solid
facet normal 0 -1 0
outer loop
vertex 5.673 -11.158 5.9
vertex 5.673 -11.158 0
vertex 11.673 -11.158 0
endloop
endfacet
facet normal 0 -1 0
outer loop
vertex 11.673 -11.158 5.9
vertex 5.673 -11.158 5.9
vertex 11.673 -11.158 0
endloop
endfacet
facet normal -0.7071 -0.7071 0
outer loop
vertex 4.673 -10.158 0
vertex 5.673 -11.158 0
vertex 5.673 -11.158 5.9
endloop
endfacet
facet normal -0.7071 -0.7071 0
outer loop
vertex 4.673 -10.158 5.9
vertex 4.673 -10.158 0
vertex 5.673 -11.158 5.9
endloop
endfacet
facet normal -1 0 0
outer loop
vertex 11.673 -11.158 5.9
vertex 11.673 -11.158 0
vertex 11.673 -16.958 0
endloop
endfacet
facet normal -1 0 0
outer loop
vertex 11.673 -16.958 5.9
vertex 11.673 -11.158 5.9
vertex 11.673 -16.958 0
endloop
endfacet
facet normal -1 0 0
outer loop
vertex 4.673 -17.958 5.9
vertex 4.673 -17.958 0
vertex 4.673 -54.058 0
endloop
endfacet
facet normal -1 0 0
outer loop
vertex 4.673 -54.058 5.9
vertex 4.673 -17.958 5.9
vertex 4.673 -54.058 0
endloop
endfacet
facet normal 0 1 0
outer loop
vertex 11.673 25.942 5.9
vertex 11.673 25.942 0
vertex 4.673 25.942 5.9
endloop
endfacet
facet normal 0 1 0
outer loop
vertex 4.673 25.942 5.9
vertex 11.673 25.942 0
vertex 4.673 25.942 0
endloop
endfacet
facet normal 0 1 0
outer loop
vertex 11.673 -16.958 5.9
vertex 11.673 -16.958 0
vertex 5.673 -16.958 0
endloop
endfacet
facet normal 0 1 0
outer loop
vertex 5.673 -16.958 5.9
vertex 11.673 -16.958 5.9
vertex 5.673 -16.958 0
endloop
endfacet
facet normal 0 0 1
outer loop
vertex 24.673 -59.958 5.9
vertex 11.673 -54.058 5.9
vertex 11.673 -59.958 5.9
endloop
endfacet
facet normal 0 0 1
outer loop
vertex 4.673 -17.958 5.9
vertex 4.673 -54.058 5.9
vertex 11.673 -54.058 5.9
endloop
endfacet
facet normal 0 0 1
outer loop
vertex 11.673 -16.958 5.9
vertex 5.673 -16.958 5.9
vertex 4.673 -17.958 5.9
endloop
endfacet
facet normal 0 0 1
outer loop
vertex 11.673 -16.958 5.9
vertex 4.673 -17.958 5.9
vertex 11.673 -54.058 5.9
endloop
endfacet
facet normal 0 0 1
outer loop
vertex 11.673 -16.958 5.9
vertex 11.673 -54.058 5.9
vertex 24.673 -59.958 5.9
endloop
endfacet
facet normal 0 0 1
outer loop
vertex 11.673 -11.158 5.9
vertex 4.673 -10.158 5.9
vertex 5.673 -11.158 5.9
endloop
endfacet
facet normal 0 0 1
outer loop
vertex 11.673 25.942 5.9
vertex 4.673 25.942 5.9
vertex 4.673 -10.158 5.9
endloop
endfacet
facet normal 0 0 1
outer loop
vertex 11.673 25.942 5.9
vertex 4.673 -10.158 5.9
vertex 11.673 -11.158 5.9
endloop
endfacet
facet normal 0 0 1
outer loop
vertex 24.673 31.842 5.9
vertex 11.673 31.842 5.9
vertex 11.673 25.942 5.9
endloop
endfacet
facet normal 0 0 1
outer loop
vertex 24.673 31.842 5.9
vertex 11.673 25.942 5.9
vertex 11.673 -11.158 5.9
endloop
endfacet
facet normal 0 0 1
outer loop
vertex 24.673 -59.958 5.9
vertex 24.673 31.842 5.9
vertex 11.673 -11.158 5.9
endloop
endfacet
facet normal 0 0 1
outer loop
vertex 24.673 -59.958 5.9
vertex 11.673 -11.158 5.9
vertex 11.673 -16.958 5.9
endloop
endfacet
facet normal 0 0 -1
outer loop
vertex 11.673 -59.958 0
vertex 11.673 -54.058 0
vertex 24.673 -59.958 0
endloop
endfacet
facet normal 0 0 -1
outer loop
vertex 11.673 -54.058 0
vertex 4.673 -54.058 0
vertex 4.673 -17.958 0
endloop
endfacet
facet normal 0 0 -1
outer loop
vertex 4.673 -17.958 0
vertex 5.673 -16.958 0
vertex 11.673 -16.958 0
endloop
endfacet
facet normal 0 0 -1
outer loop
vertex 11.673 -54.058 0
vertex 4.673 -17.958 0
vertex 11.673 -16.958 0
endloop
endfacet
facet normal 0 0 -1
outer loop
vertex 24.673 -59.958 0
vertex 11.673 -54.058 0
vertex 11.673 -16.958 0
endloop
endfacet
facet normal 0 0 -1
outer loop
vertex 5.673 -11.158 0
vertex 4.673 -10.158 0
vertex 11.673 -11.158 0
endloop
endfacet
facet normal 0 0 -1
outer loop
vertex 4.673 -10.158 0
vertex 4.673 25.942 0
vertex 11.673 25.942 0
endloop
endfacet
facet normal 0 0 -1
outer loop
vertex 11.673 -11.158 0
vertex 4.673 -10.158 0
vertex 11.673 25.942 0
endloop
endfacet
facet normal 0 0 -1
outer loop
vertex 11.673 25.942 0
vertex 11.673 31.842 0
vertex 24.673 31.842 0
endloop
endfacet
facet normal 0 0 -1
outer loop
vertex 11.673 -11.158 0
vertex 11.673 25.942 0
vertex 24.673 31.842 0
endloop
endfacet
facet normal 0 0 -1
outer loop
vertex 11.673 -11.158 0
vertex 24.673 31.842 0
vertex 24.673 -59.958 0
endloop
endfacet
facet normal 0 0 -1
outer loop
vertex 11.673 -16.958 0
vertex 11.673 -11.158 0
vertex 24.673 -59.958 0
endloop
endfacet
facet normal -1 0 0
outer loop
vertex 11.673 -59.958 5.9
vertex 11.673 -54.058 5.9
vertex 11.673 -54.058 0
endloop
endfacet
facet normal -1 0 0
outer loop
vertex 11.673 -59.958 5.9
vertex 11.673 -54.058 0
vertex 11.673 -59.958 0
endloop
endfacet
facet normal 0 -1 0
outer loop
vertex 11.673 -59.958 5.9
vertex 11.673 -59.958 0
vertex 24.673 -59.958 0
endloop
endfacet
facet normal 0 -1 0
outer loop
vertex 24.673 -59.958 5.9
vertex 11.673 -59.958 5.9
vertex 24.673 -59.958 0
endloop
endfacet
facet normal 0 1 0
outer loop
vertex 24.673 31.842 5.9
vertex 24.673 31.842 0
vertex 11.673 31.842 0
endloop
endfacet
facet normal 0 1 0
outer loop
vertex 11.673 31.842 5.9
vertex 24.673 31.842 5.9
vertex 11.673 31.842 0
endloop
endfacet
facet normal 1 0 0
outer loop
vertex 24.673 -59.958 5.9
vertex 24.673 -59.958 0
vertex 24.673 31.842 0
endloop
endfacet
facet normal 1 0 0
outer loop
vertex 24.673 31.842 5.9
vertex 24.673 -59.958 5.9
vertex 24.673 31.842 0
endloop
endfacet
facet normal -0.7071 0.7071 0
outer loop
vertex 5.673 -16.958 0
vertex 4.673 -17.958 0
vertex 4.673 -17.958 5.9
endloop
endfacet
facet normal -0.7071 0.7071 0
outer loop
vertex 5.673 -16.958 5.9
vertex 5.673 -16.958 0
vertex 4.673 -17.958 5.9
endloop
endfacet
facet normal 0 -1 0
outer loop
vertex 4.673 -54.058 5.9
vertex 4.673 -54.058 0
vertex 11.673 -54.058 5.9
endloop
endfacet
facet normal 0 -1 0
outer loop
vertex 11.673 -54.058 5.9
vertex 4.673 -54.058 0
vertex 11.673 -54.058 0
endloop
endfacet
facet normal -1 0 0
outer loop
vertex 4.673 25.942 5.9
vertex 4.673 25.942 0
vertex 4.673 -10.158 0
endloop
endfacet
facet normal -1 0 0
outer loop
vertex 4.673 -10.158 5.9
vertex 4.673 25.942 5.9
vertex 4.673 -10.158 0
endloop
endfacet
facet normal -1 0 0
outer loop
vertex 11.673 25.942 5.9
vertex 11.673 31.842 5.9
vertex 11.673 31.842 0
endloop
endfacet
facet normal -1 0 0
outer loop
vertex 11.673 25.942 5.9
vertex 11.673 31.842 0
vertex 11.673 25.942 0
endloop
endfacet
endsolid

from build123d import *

# Parameters (mm, degrees)
F2_DEPTH = 5.9
F3_SIZE  = 1


with BuildPart() as f2:
    # F1 (on Top) → F2 (new body)
    with BuildSketch(Plane.XY):
        Polygon((4.6730719134, -54.0581345186), (11.6730719134, -54.0581345186), (11.6730719134, -59.9581345186), (24.6730719134, -59.9581345186), (24.6730719134, -54.0581345186), (24.6730719134, 25.9418654814), (24.6730719134, 31.8418654814), (11.6730719134, 31.8418654814), (11.6730719134, 25.9418654814), (4.6730719134, 25.9418654814), (4.6730719134, -11.1581345186), (11.6730719134, -11.1581345186), (11.6730719134, -16.9581345186), (4.6730719134, -16.9581345186), align=None)
    extrude(amount=F2_DEPTH)

    # F3
    f3_edges = [f2.edges().sort_by_distance(p)[0] for p in [
        (4.673072, -11.158135, 2.95),
        (4.673072, -16.958135, 2.95),
    ]]
    chamfer(f3_edges, length=F3_SIZE)


solid = f2.part
